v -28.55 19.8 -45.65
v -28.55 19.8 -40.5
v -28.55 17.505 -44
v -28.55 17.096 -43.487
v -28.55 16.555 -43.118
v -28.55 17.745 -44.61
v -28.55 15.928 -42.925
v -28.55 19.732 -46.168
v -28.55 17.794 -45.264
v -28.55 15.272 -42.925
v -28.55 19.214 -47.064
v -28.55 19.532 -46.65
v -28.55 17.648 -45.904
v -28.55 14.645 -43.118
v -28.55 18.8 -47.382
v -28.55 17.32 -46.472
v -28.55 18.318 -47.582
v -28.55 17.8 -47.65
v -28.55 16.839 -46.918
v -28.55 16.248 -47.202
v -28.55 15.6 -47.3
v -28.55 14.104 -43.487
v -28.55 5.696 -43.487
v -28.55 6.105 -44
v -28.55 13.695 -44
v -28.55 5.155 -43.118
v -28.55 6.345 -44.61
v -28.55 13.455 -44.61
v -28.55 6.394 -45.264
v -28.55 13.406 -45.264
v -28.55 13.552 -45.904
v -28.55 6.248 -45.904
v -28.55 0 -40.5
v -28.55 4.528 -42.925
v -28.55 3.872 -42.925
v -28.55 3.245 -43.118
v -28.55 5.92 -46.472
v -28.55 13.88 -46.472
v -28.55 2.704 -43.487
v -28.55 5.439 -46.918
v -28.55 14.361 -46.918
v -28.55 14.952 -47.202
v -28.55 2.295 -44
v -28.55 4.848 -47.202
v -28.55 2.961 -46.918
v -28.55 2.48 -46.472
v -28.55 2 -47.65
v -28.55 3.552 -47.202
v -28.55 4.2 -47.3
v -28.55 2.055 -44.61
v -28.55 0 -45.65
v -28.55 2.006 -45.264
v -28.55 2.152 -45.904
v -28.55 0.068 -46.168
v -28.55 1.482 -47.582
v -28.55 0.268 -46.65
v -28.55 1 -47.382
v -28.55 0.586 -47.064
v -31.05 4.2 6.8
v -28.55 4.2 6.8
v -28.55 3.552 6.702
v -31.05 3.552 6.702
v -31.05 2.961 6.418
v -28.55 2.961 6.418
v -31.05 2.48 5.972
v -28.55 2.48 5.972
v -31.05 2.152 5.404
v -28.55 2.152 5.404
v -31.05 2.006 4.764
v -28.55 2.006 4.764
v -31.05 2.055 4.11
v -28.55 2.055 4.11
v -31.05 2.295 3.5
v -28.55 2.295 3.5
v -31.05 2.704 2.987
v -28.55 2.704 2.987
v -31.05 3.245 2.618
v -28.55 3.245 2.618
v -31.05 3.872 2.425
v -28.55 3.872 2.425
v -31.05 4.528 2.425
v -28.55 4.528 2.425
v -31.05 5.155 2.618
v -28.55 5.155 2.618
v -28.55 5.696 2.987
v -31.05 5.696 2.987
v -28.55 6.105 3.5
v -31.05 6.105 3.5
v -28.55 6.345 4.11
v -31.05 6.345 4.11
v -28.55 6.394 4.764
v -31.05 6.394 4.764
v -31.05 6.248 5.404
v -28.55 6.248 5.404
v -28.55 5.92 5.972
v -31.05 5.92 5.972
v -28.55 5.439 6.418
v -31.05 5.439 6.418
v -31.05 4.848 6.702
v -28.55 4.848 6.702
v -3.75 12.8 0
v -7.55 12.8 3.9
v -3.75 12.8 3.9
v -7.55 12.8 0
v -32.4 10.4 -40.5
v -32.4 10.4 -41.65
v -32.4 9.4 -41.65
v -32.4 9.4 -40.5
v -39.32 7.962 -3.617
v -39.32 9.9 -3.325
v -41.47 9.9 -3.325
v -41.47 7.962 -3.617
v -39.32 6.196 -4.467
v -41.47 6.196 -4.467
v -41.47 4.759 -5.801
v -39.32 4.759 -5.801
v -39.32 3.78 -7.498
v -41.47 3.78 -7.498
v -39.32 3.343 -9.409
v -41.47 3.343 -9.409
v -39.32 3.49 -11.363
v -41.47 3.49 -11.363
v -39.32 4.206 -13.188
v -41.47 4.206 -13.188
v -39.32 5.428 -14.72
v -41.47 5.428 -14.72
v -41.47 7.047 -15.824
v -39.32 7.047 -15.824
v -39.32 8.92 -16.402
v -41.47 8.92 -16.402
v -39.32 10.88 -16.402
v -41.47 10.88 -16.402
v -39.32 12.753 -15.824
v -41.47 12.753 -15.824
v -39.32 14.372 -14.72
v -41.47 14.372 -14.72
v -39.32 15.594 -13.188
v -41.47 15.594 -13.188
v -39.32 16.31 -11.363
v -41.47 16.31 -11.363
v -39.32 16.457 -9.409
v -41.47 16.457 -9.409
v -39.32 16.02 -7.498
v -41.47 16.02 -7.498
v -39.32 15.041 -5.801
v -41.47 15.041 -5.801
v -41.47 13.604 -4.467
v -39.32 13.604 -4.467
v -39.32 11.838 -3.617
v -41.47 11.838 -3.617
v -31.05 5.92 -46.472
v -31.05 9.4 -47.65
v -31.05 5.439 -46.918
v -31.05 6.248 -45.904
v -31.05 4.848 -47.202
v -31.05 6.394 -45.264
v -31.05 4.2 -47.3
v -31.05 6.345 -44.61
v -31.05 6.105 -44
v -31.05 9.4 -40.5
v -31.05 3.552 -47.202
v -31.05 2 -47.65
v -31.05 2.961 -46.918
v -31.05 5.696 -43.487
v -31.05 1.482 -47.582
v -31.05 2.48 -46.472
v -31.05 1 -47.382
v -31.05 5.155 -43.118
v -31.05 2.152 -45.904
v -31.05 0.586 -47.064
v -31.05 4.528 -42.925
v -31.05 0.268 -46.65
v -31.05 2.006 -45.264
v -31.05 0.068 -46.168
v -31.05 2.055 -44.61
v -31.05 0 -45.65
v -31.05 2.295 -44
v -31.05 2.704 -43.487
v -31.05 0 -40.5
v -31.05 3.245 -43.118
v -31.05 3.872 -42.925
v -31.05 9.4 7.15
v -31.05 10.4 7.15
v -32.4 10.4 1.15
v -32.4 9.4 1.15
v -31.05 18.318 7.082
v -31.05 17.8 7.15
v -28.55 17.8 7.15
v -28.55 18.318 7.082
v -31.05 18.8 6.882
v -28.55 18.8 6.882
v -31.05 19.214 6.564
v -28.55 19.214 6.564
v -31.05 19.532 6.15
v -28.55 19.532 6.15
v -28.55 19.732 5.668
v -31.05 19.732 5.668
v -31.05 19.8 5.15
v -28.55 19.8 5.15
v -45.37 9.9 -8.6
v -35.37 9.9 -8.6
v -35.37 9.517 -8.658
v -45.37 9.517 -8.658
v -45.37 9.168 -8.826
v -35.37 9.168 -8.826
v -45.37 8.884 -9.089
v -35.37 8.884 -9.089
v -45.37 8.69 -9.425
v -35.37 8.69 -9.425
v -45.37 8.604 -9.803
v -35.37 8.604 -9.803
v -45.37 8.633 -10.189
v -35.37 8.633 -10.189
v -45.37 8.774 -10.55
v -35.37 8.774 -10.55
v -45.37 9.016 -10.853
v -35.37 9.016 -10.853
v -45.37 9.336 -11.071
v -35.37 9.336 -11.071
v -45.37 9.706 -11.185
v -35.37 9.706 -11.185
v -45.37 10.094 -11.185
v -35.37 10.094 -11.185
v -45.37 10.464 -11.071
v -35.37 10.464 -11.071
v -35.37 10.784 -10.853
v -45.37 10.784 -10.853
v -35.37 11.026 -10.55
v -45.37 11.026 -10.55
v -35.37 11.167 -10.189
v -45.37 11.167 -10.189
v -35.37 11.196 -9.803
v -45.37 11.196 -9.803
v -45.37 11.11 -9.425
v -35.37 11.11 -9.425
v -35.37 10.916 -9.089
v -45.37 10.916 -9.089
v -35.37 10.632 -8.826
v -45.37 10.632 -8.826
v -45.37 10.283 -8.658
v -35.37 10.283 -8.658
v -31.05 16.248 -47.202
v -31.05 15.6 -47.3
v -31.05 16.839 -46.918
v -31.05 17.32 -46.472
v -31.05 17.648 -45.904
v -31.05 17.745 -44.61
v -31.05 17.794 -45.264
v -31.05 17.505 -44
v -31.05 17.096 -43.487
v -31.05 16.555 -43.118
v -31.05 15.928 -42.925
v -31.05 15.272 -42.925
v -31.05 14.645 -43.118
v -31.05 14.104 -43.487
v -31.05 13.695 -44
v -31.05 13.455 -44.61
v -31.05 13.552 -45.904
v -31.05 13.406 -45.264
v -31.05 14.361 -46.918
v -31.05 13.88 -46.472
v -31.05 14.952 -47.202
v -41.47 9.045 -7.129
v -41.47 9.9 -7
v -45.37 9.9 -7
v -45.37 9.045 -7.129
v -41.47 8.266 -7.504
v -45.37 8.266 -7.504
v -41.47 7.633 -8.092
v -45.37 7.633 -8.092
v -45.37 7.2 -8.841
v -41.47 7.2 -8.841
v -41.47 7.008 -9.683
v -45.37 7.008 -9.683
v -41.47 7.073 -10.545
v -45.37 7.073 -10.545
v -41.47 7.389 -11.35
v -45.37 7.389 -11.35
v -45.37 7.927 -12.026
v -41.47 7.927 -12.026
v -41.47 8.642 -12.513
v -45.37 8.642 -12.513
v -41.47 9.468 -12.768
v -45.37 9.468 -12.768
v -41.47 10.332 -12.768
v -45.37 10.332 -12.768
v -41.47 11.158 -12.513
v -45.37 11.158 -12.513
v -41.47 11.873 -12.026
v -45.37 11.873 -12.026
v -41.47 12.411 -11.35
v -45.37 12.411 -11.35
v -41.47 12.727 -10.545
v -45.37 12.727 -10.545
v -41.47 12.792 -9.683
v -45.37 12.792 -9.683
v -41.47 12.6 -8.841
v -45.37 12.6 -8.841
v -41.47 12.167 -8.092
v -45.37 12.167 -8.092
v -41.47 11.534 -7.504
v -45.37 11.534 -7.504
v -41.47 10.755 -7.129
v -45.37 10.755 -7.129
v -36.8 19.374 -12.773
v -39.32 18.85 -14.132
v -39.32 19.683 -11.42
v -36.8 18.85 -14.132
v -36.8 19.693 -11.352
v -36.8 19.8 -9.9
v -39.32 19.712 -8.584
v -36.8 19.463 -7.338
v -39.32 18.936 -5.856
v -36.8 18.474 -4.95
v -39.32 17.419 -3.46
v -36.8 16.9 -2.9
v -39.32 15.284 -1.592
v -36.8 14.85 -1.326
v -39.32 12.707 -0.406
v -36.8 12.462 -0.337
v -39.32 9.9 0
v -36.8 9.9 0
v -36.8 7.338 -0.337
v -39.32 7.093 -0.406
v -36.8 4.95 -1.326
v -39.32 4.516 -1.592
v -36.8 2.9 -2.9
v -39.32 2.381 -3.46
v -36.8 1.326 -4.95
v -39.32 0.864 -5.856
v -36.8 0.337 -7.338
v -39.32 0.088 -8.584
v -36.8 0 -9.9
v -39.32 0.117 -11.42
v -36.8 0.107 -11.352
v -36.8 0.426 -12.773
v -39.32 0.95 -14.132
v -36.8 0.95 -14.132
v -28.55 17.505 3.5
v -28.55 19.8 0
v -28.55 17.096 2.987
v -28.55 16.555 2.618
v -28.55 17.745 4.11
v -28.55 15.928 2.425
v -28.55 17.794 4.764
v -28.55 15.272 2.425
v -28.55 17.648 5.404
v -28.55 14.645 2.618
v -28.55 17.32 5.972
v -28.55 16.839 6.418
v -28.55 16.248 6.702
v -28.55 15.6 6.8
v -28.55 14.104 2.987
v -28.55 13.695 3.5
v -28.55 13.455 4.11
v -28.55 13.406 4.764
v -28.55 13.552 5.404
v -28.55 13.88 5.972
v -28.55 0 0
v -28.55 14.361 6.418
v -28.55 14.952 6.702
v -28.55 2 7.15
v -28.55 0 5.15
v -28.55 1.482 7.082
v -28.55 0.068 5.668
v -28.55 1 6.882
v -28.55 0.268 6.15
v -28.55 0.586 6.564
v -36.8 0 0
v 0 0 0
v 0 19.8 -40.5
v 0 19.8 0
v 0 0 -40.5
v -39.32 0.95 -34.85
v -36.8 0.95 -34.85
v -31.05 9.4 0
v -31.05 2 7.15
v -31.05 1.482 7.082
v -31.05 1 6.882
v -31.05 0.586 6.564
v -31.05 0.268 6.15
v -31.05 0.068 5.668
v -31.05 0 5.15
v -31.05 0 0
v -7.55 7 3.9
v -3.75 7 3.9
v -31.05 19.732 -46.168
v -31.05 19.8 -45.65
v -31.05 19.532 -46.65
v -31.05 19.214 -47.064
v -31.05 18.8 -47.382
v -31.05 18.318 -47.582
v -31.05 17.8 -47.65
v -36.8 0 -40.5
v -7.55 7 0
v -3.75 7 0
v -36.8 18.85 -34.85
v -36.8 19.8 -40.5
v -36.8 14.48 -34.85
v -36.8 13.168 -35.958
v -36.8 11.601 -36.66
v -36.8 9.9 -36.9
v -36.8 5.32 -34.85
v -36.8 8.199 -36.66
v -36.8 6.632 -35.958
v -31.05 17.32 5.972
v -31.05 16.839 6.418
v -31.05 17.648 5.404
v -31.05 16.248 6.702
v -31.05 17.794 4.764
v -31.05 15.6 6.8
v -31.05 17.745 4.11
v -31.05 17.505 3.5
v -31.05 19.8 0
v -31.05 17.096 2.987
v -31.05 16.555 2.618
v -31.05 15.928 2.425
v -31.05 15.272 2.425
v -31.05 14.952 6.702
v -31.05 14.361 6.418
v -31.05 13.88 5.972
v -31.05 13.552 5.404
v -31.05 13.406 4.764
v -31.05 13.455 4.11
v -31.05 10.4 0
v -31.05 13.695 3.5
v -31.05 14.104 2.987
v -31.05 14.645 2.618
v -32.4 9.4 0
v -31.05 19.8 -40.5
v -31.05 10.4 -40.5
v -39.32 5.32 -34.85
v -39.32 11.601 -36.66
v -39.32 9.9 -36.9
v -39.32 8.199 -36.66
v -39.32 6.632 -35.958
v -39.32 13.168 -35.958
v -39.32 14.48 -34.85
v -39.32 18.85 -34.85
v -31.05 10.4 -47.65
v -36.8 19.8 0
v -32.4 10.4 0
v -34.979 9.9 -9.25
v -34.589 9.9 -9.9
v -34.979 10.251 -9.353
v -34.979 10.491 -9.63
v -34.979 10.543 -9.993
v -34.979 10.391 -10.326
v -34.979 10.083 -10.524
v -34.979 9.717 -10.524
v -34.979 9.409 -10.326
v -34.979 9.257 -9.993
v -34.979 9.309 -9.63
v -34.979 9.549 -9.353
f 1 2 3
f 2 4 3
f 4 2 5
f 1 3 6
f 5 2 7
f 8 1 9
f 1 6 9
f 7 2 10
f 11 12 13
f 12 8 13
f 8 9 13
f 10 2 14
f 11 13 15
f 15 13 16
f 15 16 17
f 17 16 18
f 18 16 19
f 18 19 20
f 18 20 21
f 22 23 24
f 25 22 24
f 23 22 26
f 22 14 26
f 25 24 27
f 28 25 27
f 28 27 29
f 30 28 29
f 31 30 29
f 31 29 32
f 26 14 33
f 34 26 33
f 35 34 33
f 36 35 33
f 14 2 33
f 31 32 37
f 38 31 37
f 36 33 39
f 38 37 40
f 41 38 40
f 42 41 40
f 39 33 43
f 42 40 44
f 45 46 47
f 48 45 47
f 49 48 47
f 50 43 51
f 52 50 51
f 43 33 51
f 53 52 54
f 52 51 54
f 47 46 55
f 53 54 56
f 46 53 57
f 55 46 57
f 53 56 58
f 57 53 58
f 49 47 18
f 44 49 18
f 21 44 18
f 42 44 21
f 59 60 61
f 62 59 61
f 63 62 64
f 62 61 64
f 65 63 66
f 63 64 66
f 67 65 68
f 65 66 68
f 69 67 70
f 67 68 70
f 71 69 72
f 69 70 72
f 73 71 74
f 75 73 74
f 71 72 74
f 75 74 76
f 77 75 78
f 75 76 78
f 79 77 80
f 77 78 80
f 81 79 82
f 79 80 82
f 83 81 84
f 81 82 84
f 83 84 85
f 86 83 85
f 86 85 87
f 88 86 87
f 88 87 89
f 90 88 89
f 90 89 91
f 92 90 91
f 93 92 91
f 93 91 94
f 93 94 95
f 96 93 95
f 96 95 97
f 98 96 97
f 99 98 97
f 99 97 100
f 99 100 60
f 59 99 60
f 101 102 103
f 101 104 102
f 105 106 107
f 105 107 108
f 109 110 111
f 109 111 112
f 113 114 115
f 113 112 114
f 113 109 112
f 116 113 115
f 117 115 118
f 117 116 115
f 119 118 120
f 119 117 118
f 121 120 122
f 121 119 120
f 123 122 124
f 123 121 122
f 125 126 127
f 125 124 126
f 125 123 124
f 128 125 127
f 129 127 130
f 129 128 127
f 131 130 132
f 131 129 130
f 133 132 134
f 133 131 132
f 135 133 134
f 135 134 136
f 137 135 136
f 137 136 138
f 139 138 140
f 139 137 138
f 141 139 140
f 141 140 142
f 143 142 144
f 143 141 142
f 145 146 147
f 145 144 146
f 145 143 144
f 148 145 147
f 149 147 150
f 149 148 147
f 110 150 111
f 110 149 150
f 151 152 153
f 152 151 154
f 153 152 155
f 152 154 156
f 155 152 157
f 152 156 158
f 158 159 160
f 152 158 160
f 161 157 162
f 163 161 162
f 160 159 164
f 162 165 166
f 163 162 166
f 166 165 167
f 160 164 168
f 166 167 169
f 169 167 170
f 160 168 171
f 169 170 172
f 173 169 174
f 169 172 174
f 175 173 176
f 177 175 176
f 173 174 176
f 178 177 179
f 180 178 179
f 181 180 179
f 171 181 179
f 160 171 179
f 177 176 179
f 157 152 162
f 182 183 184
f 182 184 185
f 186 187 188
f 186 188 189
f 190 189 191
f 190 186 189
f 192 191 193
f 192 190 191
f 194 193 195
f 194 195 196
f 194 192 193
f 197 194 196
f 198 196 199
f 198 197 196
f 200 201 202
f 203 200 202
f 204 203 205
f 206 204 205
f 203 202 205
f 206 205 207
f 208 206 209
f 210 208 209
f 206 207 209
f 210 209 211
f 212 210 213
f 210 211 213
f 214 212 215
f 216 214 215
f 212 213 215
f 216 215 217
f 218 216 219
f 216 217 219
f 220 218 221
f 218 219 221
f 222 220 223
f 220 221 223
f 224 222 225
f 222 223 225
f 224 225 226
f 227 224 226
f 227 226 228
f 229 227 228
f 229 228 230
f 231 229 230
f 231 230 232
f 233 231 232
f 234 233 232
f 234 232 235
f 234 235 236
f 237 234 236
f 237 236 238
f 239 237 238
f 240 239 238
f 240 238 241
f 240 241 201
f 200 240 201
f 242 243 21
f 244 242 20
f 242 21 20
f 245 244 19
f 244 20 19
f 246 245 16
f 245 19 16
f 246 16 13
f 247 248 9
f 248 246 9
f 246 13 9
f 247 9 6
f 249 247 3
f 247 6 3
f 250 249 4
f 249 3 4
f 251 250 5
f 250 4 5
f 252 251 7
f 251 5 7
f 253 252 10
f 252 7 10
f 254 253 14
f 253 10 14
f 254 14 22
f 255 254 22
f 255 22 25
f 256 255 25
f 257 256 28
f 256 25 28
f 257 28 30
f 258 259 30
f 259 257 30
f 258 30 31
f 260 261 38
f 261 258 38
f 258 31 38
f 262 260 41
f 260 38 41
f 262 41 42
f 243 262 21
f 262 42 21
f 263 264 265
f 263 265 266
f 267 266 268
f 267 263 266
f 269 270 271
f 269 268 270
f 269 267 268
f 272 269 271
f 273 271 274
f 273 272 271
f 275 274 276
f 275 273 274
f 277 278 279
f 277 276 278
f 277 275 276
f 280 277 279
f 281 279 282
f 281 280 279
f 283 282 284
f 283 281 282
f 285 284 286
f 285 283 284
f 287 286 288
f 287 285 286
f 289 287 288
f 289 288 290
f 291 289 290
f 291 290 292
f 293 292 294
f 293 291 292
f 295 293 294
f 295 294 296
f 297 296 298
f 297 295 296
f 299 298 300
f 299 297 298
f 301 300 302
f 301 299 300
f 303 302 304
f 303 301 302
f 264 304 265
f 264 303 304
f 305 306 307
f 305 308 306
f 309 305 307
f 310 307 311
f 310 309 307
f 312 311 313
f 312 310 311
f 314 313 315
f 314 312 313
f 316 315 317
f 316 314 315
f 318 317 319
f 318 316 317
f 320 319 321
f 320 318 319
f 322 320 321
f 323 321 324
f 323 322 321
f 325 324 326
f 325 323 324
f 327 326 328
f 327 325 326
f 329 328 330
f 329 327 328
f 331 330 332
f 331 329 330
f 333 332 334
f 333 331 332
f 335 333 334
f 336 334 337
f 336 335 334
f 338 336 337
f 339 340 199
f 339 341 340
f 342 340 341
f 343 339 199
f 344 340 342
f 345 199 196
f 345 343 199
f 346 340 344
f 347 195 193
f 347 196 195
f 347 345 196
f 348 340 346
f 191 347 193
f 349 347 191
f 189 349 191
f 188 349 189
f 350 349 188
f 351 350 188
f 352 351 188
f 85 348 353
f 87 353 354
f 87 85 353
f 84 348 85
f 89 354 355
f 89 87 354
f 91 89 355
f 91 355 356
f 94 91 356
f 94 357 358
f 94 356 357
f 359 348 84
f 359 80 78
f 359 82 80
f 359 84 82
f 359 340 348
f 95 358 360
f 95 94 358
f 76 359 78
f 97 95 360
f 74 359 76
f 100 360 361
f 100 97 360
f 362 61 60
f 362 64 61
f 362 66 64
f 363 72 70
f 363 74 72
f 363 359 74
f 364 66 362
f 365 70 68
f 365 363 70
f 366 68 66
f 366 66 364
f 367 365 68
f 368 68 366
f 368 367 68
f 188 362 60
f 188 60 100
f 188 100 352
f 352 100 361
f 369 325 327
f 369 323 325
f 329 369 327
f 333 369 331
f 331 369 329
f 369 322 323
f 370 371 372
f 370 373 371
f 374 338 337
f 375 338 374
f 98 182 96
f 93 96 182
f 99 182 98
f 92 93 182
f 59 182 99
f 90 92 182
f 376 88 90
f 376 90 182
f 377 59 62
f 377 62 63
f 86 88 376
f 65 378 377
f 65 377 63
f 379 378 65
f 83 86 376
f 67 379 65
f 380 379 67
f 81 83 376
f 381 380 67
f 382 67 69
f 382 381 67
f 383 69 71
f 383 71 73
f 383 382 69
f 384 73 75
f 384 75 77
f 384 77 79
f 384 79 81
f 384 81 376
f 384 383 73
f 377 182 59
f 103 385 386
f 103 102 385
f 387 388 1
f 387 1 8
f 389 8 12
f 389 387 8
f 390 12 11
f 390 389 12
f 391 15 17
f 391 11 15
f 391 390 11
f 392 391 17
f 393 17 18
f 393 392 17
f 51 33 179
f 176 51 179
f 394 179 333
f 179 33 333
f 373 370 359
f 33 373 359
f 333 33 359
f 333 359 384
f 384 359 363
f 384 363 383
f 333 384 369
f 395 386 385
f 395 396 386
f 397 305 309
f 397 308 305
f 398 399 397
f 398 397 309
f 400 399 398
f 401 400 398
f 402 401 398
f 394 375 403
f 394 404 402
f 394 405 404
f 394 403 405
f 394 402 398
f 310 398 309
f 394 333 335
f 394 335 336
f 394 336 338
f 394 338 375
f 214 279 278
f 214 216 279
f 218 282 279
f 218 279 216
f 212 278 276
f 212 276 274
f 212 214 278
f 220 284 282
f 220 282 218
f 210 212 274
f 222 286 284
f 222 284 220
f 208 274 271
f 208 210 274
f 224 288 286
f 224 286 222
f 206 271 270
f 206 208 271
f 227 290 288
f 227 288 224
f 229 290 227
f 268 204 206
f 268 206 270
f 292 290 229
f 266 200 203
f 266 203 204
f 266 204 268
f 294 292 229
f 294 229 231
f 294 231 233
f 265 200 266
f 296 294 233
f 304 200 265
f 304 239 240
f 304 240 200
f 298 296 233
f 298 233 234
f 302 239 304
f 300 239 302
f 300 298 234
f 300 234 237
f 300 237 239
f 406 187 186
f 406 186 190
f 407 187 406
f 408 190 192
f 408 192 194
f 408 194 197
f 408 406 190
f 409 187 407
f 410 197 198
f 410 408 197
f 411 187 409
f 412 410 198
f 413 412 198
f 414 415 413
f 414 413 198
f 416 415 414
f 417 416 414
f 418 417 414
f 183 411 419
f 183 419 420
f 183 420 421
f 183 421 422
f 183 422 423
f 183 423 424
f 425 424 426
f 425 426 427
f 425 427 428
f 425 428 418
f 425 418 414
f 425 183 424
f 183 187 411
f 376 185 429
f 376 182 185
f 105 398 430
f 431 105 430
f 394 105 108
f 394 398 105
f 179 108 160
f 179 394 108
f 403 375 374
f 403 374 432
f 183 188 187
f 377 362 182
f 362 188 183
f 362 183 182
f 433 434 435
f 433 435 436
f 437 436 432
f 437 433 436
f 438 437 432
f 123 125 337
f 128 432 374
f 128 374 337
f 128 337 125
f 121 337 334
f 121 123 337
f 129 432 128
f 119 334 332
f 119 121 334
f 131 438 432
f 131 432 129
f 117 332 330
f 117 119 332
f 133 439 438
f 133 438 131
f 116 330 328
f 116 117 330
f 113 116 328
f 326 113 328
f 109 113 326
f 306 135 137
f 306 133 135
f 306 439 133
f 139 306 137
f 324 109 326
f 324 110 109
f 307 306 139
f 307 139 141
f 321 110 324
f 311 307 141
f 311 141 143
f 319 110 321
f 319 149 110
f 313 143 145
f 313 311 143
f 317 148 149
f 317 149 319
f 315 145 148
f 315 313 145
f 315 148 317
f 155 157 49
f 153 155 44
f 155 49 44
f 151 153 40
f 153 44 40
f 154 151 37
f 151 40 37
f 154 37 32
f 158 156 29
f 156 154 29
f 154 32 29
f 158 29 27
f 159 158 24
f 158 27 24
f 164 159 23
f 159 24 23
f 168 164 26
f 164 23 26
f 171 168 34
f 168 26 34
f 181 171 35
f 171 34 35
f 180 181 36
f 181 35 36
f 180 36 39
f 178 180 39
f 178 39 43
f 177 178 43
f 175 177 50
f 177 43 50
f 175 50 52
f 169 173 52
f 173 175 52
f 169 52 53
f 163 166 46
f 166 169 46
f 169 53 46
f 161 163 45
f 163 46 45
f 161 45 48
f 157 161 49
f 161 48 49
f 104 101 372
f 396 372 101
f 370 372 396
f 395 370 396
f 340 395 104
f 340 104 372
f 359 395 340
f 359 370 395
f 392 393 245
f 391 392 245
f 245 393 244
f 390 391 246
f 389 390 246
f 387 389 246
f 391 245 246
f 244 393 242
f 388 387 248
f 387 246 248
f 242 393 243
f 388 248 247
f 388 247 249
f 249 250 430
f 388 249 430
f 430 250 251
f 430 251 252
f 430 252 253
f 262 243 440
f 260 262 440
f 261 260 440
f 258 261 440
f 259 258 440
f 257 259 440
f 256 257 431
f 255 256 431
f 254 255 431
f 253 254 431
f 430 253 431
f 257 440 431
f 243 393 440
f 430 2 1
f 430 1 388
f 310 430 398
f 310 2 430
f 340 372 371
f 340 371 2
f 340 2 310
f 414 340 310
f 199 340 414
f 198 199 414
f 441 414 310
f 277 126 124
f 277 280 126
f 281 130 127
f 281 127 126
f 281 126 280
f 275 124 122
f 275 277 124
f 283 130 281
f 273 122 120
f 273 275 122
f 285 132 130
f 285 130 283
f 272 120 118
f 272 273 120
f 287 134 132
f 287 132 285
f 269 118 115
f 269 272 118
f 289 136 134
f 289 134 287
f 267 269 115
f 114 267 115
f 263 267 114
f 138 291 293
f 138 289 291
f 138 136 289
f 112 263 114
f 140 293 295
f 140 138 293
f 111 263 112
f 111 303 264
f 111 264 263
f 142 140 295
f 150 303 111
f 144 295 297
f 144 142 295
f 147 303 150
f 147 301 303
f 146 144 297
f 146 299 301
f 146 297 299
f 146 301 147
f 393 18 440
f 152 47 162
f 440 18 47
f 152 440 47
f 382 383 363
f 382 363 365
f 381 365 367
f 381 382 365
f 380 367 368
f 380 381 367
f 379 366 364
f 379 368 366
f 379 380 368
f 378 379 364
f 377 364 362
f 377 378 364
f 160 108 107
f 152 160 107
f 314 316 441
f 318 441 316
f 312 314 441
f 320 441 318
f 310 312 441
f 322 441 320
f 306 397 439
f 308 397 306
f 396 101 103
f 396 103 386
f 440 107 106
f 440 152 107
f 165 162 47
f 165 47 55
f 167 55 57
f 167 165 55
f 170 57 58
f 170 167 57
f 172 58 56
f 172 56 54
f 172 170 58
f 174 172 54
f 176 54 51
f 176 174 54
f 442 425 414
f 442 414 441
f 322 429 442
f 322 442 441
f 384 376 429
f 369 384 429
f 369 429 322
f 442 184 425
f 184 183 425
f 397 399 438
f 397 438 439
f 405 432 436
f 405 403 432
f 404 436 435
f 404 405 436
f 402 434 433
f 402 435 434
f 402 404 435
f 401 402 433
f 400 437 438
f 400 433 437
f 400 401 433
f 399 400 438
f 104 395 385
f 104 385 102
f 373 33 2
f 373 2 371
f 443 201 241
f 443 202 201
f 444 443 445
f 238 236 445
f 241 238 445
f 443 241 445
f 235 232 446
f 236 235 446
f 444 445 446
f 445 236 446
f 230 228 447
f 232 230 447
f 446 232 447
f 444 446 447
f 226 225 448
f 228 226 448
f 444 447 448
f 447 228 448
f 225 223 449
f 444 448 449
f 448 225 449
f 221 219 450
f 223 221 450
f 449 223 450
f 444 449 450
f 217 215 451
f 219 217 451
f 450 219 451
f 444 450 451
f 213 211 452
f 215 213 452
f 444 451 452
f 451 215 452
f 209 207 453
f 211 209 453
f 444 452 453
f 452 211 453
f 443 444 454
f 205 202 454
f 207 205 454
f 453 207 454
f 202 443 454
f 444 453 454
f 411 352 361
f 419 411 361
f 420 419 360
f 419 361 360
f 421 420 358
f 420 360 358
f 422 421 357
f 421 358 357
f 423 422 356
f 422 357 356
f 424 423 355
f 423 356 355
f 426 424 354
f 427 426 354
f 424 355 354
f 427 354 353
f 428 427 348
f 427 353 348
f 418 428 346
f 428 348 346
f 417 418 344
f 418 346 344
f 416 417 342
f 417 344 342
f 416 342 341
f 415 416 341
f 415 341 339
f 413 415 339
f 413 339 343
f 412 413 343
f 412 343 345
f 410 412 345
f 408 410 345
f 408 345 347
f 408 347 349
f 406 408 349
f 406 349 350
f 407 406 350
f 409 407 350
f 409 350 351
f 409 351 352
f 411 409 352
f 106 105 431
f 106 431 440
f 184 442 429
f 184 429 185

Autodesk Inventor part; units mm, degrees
ref_plane "YZ Plane" through (0, 0, 0) normal (1, 0, 0) x (0, 1, 0)
ref_plane "XZ Plane" through (0, 0, 0) normal (0, 1, 0) x (-1, 0, 0)
sketch "Boceto1" plane through (0, 0, 0) normal (0, 1, 0) x (-1, 0, 0)
  line L0 (0, 0) -> (36.8, 0)
  line L1 (36.8, 0) -> (36.8, -40.5)
  line L2 (36.8, -40.5) -> (0, -40.5)
  line L3 (0, -40.5) -> (0, 0)
  line L4 (0, -40.5) -> (28.55, -40.5)
  line L5 (28.55, -40.5) -> (28.55, -47.65)
  line L6 (28.55, -47.65) -> (31.05, -47.65)
  line L7 (31.05, -47.65) -> (31.05, -40.5)
  line L8 (28.55, 0) -> (28.55, 7.15)
  line L9 (28.55, 7.15) -> (31.05, 7.15)
  line L10 (31.05, 7.15) -> (31.05, 0)
  dimension "d0" = 36.8
  dimension "d1" = 40.5
  dimension "d2" = 28.55
  dimension "d3" = 7.15
  dimension "d4" = 2.5
  dimension "d5" = 7.15
  dimension "d6" = 2.5
extrude "Extrusión1" add sketch "Boceto1" along normal blind 19.8
sketch "Boceto2" plane through (-36.8, 0, -40.5) normal (-1, 0, 0) x (0, 0, 1)
  line L0 (0, 0) -> (40.5, 0) projected
  line L1 (40.5, 0) -> (40.5, 19.8) projected
  line L2 (0, 19.8) -> (40.5, 19.8) projected
  line L3 (0, 0) -> (0, 19.8) projected
  line L4 (0, 0) -> (5.65, 0)
  line L5 (40.5, 18.85) -> (40.5, 0.95)
  line L6 (26.3683, 0.95) -> (5.65, 0.95)
  line L7 (40.5, 0) -> (40.5, 19.8) projected
  line L8 (40.5, 9.9) -> (30.6, 9.9)
  arc A0 (26.3683, 0.95) -> (26.3683, 18.85) centre (30.6, 9.9) ccw
  arc A1 (5.65, 14.48) -> (5.65, 5.32) centre (9.7412, 9.9) ccw
  line L9 (5.65, 18.85) -> (26.3683, 18.85)
  line L10 (5.65, 0.95) -> (5.65, 5.32)
  line L11 (5.65, 14.48) -> (5.65, 18.85)
  line L12 (5.65, 0.95) -> (5.65, 5.32)
  line L13 (5.65, 14.48) -> (5.65, 18.85)
  point P0 (5.65, 0.95)
  dimension "d11" = 17.9
  dimension "d12" = 9.9
extrude "Extrusión2" add sketch "Boceto2" along normal blind 2.52 contours A0 L6 L10 A1 L11 L9
sketch "Boceto3" plane through (-39.32, 0, -40.5) normal (-1, 0, 0) x (0, 0, 1)
  arc A0 (26.3683, 0.95) -> (26.3683, 18.85) centre (30.6, 9.9) ccw projected
  line L0 (26.3683, 18.85) -> (5.65, 18.85) projected
  line L1 (5.65, 18.85) -> (5.65, 14.48) projected
  arc A1 (5.65, 14.48) -> (5.65, 5.32) centre (9.7412, 9.9) ccw projected
  line L2 (5.65, 5.32) -> (5.65, 0.95) projected
  line L3 (5.65, 0.95) -> (26.3683, 0.95) projected
  circle A2 centre (30.6, 9.9) radius 6.575
  point P0 (40.5, 0)
  dimension "d18" = 13.15
extrude "Extrusión3" add sketch "Boceto3" along normal blind 2.15 contours A2
sketch "Boceto4" plane through (-41.47, 9.9, -9.9) normal (-1, 0, 0) x (0, 0, 1)
  circle A0 centre (0, 0) radius 6.575 projected
  circle A1 centre (0, 0) radius 2.9
  point P0 (9.9, -9.9)
  dimension "d21" = 5.8
extrude "Extrusión4" add sketch "Boceto4" along normal blind 3.9 contours A1
sketch "Boceto5" plane through (-45.37, 9.9, -9.9) normal (-1, 0, 0) x (0, 0, 1)
  circle A0 centre (0, 0) radius 2.9 projected
  point P0 (9.9, -9.9)
hole "Agujero1" at (-45.37, 9.9, -9.9) direction (1, 0, 0) diameter 2.6 depth 10 tip angle 118
sketch "Boceto6" plane through (-28.55, 0, 0) normal (0, 0, 1) x (1, 0, 0)
  line L0 (0, 0) -> (28.55, 0) projected
  line L1 (28.55, 0) -> (28.55, 19.8) projected
  line L2 (0, 19.8) -> (28.55, 19.8) projected
  line L3 (0, 0) -> (0, 19.8) projected
  line L4 (21, 9.9) -> (21, 12.8)
  line L5 (21, 12.8) -> (24.8, 12.8)
  line L6 (24.8, 12.8) -> (24.8, 7)
  line L7 (24.8, 7) -> (21, 7)
  line L8 (21, 7) -> (21, 12.8)
  line L9 (24.8, 12.8) -> (28.55, 12.8)
  dimension "d34" = 2.9
  dimension "d35" = 5.8
extrude "Extrusión5" add sketch "Boceto6" along normal blind 3.9 contours L6 L7 L8 L4 L5
sketch "Boceto7" plane through (-31.05, 0, 0) normal (-1, 0, 0) x (0, 0, 1)
  line L0 (0, 0) -> (7.15, 0) projected
  line L1 (7.15, 0) -> (7.15, 19.8) projected
  line L2 (0, 19.8) -> (7.15, 19.8) projected
  line L3 (0, 0) -> (0, 19.8) projected
  line L4 (0, 0) -> (2.26, 0)
  line L5 (2.26, 0) -> (2.26, 19.8)
  line L6 (7.15, 9.9) -> (0, 9.9)
  line L7 (7.15, 10.4) -> (0, 10.4)
  line L8 (7.15, 9.4) -> (0, 9.4)
  point P0 (0, 0)
  point P1 (0, 10.4)
  point P2 (0, 9.4)
  dimension "d38" = 2.26
  dimension "d39" = 0.5
  dimension "d40" = 0.5
extrude "Extrusión6" add sketch "Boceto7" along normal blind 1.35 contours L3 L6 L5 L8 | L5 L6 L1 L8 | L3 L7 L5 L6 | L5 L7 L1 L6
chamfer "Chaflán1" distance 6 distance2 1.35 1 edges at (-32.4, 9.9, 7.15) measured on face at (-32.4, 9.7333, 4.7667)
fillet "Empalme1" radius 2 2 edges at (-29.8, 0, 7.15) (-29.8, 19.8, 7.15)
sketch "Boceto8" plane through (-31.05, 0, 0) normal (-1, 0, 0) x (0, 0, 1)
  arc A0 (5.15, 0) -> (7.15, 2) centre (5.15, 2) ccw projected
  line L0 (7.15, 2) -> (7.15, 9.4) projected
  line L1 (7.15, 9.4) -> (0, 9.4) projected
  line L2 (0, 0) -> (0, 9.4) projected
  line L3 (0, 0) -> (5.15, 0) projected
  line L4 (3.575, 0) -> (3.575, 2)
  line L5 (3.575, 2) -> (3.575, 6.4)
  line L6 (0, 0) -> (2.4, 0)
  line L7 (2.4, 0) -> (2.4, 4.2)
  line L8 (2.4, 4.2) -> (4.6, 4.2)
  circle A1 centre (4.6, 4.2) radius 2.2
  arc A2 (7.15, 17.8) -> (5.15, 19.8) centre (5.15, 17.8) ccw projected
  line L9 (0, 19.8) -> (5.15, 19.8) projected
  line L10 (0, 10.4) -> (0, 19.8) projected
  line L11 (0, 10.4) -> (7.15, 10.4) projected
  line L12 (7.15, 10.4) -> (7.15, 17.8) projected
  line L13 (4.6, 4.2) -> (4.6, 19.8)
  line L14 (4.6, 19.8) -> (4.6, 15.6)
  circle A3 centre (4.6, 15.6) radius 2.2
  point P0 (0, 0)
  dimension "d47" = 2
  dimension "d48" = 4.4
  dimension "d49" = 2.4
  dimension "d50" = 2.2
  dimension "d58" = 4.2
  dimension "d59" = 4.4
hole "Agujero2" at (-31.05, 4.2, 4.6) at (-31.05, 15.6, 4.6) direction (1, 0, 0) diameter 4.4 depth 10 tip angle 118
ref_plane "Plano de trabajo1" through (-28.55, 0, -20.25) normal (0, 0, 1) x (1, 0, 0)
mirror "Simetría1" about plane through (-28.55, 0, -20.25) normal (0, 0, 1) of "Extrusión6", "Agujero2"
chamfer "Chaflán2" distance 6 distance2 1.35 1 edges at (-32.4, 9.9, -47.65) measured on face at (-32.4, 9.7333, -45.2667)
fillet "Empalme2" radius 2 2 edges at (-29.8, 0, -47.65) (-29.8, 19.8, -47.65)
ref_plane "Plano de trabajo2" through (0, 9.9, 0) normal (0, -1, 0) x (1, 0, 0)
properties part number "ServoMotor"
